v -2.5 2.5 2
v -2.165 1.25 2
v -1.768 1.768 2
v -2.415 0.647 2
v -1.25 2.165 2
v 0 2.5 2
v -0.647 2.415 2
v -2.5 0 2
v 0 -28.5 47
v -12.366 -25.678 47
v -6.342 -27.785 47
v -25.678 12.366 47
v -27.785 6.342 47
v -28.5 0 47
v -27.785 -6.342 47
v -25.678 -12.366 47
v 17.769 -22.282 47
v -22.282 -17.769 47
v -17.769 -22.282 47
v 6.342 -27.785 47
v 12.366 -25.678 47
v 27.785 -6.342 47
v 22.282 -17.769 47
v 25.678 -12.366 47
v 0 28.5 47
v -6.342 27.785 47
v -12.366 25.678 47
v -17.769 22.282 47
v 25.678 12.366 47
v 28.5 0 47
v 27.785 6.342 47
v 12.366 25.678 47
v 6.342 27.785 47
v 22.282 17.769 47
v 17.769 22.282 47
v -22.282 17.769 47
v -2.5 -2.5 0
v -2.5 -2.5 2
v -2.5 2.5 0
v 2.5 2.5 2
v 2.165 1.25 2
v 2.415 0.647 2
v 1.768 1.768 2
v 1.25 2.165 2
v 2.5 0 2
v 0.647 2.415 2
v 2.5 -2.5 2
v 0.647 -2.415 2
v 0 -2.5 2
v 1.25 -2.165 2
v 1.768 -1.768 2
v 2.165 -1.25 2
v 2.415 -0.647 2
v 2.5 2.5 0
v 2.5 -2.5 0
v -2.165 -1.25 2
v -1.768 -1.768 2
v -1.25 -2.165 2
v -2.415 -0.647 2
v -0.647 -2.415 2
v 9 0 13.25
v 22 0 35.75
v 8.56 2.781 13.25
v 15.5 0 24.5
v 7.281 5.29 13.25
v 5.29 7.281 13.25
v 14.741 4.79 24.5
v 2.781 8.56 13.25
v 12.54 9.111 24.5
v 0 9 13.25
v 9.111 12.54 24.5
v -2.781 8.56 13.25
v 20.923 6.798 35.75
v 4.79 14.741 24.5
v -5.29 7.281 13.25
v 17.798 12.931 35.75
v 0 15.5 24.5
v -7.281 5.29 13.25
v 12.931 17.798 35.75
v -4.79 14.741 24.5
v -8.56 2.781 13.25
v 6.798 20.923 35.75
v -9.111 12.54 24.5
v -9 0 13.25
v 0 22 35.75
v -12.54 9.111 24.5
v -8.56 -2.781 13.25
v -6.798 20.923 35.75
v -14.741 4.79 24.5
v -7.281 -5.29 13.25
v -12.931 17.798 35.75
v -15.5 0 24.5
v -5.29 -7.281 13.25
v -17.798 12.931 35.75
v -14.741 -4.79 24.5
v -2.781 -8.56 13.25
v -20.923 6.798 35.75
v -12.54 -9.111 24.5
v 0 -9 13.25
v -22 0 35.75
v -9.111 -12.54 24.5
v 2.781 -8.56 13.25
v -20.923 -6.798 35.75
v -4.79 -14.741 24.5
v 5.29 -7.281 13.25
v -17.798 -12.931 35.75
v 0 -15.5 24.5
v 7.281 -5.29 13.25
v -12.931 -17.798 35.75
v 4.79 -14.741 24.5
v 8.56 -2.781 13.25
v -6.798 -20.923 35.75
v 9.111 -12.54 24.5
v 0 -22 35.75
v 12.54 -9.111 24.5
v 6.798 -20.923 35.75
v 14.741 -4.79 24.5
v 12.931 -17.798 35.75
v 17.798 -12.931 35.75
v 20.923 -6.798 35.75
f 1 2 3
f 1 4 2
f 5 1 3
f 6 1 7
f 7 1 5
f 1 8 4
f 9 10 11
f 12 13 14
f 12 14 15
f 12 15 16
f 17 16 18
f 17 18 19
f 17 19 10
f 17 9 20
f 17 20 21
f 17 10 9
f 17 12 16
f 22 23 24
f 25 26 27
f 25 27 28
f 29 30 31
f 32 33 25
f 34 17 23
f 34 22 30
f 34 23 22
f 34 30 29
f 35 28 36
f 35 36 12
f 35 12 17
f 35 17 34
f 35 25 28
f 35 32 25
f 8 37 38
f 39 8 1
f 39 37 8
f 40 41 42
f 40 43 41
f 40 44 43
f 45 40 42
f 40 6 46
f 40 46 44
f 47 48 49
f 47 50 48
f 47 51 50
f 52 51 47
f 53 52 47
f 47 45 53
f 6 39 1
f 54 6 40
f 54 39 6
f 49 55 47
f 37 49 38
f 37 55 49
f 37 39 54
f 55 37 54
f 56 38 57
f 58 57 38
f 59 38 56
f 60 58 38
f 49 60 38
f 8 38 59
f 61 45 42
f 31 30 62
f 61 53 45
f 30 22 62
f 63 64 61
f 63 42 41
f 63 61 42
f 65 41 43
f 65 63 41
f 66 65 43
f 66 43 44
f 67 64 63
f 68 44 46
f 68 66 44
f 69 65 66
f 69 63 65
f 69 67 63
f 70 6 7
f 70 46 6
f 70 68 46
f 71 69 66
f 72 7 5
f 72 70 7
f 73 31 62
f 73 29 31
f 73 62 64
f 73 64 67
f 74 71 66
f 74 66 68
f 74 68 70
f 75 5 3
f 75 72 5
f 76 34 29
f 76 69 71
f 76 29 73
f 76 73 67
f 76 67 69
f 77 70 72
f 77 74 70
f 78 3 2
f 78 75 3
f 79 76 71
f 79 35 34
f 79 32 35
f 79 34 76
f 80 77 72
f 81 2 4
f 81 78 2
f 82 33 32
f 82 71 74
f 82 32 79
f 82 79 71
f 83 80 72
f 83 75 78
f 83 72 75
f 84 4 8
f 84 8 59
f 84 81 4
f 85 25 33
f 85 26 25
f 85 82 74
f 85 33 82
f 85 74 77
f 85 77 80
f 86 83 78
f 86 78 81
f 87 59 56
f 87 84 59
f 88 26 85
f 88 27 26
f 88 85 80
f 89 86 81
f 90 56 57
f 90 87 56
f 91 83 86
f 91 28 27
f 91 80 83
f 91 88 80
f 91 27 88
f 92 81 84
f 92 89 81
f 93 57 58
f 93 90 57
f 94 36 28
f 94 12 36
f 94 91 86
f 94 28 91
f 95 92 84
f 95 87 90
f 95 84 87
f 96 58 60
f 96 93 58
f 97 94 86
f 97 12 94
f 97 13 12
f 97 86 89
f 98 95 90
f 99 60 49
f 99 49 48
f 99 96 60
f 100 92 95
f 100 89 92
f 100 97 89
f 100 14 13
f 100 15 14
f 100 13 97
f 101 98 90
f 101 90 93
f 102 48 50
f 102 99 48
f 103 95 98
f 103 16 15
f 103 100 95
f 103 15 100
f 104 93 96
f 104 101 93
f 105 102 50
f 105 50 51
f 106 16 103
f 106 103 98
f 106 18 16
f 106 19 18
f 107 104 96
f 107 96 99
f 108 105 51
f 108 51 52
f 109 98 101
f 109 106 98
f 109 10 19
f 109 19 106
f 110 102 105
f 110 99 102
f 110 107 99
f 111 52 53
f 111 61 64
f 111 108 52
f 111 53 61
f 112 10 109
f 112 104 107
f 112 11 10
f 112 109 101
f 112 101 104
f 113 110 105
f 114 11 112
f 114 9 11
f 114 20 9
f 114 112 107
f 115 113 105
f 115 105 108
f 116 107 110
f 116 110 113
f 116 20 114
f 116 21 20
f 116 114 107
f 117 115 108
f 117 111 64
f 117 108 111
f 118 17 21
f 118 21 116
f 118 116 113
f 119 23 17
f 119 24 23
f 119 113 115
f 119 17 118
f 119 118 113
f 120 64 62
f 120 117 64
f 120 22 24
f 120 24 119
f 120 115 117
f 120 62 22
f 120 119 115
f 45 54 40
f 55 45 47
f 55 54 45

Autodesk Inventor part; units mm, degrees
ref_plane "YZ Plane" through (0, 0, 0) normal (1, 0, 0) x (0, 1, 0)
ref_plane "XZ Plane" through (0, 0, 0) normal (0, 1, 0) x (-1, 0, 0)
ref_plane "XY Plane" through (0, 0, 0) normal (0, 0, 1) x (1, 0, 0)
sketch "Sketch1" plane through (0, 0, 0) normal (0, 0, 1) x (1, 0, 0)
  line L0 (-2.5, 2.5) -> (2.5, 2.5)
  line L1 (2.5, 2.5) -> (2.5, -2.5)
  line L2 (2.5, -2.5) -> (-2.5, -2.5)
  line L3 (-2.5, -2.5) -> (-2.5, 2.5)
  line L4 (-2.5, 2.5) -> (2.5, -2.5) construction
  line L5 (2.5, 2.5) -> (-2.5, -2.5) construction
  circle A0 centre (0, 0) radius 2.25
  dimension "d0" = 5
  dimension "d1" = 5
  dimension "d2" = 4.5
extrude "Extrusion1" add sketch "Sketch1" along normal blind 2 contours L0 L1 L2 L3 | A0
sketch "Sketch2" plane through (-2.5, -2.5, 0) normal (0, -1, 0) x (1, 0, 0)
  line L0 (5, 0) -> (0, 0) projected
  line L1 (5, 0) -> (5, 2) projected
  line L2 (0, 2) -> (5, 2) projected
  line L3 (0, 0) -> (0, 2) projected
  line L4 (5, 2) -> (0, 2) projected
  line L5 (0, 2) -> (-25.9808, 47)
  line L6 (-25.9808, 47) -> (30.9808, 47)
  line L7 (5, 2) -> (30.9808, 47)
  point P0 (2.5, 0)
  dimension "d5" = 120
  dimension "d6" = 120
  dimension "d7" = 45
  dimension "d9" = 56.9615
sketch "Sketch3" plane through (0, 0, 2) normal (0, 0, 1) x (1, 0, 0)
  circle A0 centre (0, 0) radius 2.5
ref_plane "Work Plane1" through (0, 0, 47) normal (0, 0, 1) x (1, 0, 0)
sketch "Sketch4" plane through (0, 0, 47) normal (0, 0, 1) x (1, 0, 0)
  circle A0 centre (0, 0) radius 28.5
  point P0 (28.4808, -2.5)
  dimension "d10" = 57
loft "Loft1" add profiles "Sketch3", "Sketch4"
equation "\"d6\" = d5"
properties part number "led 5050"
